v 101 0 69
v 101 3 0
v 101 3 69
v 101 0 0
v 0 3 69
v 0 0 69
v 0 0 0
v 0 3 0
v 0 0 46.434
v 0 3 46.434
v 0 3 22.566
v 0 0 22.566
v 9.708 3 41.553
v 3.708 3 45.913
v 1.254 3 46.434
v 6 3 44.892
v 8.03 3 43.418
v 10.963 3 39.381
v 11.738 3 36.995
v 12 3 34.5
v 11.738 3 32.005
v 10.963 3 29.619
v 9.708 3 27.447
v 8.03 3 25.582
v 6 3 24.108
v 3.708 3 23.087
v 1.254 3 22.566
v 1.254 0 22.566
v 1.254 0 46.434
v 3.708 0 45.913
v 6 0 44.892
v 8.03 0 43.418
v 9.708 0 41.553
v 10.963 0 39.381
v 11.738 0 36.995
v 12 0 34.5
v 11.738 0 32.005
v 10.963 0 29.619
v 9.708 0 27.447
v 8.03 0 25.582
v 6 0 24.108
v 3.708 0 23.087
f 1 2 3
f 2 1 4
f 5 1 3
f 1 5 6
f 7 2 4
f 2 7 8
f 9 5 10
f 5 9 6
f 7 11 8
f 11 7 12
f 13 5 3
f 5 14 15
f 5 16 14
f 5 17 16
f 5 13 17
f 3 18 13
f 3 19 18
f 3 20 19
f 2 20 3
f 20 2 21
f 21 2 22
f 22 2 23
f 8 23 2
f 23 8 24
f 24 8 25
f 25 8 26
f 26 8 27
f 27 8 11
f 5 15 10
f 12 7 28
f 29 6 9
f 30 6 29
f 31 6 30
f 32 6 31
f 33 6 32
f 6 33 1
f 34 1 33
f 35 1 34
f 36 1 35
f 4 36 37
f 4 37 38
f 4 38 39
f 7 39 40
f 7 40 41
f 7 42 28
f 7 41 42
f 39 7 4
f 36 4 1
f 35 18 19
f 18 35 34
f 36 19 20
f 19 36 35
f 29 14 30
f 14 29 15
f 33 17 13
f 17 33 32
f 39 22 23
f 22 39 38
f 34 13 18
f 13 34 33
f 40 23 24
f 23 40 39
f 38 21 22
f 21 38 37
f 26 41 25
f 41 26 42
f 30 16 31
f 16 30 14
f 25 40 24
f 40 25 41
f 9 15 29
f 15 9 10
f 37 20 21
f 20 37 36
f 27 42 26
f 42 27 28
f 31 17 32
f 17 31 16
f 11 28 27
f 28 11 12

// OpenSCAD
difference() {
    cube([101,3,69]);
    translate([0, 3, 34.5]) {
        rotate([90,0,0])
        cylinder(h = 3, r = 12);  
    }
}
        
        
     
        
